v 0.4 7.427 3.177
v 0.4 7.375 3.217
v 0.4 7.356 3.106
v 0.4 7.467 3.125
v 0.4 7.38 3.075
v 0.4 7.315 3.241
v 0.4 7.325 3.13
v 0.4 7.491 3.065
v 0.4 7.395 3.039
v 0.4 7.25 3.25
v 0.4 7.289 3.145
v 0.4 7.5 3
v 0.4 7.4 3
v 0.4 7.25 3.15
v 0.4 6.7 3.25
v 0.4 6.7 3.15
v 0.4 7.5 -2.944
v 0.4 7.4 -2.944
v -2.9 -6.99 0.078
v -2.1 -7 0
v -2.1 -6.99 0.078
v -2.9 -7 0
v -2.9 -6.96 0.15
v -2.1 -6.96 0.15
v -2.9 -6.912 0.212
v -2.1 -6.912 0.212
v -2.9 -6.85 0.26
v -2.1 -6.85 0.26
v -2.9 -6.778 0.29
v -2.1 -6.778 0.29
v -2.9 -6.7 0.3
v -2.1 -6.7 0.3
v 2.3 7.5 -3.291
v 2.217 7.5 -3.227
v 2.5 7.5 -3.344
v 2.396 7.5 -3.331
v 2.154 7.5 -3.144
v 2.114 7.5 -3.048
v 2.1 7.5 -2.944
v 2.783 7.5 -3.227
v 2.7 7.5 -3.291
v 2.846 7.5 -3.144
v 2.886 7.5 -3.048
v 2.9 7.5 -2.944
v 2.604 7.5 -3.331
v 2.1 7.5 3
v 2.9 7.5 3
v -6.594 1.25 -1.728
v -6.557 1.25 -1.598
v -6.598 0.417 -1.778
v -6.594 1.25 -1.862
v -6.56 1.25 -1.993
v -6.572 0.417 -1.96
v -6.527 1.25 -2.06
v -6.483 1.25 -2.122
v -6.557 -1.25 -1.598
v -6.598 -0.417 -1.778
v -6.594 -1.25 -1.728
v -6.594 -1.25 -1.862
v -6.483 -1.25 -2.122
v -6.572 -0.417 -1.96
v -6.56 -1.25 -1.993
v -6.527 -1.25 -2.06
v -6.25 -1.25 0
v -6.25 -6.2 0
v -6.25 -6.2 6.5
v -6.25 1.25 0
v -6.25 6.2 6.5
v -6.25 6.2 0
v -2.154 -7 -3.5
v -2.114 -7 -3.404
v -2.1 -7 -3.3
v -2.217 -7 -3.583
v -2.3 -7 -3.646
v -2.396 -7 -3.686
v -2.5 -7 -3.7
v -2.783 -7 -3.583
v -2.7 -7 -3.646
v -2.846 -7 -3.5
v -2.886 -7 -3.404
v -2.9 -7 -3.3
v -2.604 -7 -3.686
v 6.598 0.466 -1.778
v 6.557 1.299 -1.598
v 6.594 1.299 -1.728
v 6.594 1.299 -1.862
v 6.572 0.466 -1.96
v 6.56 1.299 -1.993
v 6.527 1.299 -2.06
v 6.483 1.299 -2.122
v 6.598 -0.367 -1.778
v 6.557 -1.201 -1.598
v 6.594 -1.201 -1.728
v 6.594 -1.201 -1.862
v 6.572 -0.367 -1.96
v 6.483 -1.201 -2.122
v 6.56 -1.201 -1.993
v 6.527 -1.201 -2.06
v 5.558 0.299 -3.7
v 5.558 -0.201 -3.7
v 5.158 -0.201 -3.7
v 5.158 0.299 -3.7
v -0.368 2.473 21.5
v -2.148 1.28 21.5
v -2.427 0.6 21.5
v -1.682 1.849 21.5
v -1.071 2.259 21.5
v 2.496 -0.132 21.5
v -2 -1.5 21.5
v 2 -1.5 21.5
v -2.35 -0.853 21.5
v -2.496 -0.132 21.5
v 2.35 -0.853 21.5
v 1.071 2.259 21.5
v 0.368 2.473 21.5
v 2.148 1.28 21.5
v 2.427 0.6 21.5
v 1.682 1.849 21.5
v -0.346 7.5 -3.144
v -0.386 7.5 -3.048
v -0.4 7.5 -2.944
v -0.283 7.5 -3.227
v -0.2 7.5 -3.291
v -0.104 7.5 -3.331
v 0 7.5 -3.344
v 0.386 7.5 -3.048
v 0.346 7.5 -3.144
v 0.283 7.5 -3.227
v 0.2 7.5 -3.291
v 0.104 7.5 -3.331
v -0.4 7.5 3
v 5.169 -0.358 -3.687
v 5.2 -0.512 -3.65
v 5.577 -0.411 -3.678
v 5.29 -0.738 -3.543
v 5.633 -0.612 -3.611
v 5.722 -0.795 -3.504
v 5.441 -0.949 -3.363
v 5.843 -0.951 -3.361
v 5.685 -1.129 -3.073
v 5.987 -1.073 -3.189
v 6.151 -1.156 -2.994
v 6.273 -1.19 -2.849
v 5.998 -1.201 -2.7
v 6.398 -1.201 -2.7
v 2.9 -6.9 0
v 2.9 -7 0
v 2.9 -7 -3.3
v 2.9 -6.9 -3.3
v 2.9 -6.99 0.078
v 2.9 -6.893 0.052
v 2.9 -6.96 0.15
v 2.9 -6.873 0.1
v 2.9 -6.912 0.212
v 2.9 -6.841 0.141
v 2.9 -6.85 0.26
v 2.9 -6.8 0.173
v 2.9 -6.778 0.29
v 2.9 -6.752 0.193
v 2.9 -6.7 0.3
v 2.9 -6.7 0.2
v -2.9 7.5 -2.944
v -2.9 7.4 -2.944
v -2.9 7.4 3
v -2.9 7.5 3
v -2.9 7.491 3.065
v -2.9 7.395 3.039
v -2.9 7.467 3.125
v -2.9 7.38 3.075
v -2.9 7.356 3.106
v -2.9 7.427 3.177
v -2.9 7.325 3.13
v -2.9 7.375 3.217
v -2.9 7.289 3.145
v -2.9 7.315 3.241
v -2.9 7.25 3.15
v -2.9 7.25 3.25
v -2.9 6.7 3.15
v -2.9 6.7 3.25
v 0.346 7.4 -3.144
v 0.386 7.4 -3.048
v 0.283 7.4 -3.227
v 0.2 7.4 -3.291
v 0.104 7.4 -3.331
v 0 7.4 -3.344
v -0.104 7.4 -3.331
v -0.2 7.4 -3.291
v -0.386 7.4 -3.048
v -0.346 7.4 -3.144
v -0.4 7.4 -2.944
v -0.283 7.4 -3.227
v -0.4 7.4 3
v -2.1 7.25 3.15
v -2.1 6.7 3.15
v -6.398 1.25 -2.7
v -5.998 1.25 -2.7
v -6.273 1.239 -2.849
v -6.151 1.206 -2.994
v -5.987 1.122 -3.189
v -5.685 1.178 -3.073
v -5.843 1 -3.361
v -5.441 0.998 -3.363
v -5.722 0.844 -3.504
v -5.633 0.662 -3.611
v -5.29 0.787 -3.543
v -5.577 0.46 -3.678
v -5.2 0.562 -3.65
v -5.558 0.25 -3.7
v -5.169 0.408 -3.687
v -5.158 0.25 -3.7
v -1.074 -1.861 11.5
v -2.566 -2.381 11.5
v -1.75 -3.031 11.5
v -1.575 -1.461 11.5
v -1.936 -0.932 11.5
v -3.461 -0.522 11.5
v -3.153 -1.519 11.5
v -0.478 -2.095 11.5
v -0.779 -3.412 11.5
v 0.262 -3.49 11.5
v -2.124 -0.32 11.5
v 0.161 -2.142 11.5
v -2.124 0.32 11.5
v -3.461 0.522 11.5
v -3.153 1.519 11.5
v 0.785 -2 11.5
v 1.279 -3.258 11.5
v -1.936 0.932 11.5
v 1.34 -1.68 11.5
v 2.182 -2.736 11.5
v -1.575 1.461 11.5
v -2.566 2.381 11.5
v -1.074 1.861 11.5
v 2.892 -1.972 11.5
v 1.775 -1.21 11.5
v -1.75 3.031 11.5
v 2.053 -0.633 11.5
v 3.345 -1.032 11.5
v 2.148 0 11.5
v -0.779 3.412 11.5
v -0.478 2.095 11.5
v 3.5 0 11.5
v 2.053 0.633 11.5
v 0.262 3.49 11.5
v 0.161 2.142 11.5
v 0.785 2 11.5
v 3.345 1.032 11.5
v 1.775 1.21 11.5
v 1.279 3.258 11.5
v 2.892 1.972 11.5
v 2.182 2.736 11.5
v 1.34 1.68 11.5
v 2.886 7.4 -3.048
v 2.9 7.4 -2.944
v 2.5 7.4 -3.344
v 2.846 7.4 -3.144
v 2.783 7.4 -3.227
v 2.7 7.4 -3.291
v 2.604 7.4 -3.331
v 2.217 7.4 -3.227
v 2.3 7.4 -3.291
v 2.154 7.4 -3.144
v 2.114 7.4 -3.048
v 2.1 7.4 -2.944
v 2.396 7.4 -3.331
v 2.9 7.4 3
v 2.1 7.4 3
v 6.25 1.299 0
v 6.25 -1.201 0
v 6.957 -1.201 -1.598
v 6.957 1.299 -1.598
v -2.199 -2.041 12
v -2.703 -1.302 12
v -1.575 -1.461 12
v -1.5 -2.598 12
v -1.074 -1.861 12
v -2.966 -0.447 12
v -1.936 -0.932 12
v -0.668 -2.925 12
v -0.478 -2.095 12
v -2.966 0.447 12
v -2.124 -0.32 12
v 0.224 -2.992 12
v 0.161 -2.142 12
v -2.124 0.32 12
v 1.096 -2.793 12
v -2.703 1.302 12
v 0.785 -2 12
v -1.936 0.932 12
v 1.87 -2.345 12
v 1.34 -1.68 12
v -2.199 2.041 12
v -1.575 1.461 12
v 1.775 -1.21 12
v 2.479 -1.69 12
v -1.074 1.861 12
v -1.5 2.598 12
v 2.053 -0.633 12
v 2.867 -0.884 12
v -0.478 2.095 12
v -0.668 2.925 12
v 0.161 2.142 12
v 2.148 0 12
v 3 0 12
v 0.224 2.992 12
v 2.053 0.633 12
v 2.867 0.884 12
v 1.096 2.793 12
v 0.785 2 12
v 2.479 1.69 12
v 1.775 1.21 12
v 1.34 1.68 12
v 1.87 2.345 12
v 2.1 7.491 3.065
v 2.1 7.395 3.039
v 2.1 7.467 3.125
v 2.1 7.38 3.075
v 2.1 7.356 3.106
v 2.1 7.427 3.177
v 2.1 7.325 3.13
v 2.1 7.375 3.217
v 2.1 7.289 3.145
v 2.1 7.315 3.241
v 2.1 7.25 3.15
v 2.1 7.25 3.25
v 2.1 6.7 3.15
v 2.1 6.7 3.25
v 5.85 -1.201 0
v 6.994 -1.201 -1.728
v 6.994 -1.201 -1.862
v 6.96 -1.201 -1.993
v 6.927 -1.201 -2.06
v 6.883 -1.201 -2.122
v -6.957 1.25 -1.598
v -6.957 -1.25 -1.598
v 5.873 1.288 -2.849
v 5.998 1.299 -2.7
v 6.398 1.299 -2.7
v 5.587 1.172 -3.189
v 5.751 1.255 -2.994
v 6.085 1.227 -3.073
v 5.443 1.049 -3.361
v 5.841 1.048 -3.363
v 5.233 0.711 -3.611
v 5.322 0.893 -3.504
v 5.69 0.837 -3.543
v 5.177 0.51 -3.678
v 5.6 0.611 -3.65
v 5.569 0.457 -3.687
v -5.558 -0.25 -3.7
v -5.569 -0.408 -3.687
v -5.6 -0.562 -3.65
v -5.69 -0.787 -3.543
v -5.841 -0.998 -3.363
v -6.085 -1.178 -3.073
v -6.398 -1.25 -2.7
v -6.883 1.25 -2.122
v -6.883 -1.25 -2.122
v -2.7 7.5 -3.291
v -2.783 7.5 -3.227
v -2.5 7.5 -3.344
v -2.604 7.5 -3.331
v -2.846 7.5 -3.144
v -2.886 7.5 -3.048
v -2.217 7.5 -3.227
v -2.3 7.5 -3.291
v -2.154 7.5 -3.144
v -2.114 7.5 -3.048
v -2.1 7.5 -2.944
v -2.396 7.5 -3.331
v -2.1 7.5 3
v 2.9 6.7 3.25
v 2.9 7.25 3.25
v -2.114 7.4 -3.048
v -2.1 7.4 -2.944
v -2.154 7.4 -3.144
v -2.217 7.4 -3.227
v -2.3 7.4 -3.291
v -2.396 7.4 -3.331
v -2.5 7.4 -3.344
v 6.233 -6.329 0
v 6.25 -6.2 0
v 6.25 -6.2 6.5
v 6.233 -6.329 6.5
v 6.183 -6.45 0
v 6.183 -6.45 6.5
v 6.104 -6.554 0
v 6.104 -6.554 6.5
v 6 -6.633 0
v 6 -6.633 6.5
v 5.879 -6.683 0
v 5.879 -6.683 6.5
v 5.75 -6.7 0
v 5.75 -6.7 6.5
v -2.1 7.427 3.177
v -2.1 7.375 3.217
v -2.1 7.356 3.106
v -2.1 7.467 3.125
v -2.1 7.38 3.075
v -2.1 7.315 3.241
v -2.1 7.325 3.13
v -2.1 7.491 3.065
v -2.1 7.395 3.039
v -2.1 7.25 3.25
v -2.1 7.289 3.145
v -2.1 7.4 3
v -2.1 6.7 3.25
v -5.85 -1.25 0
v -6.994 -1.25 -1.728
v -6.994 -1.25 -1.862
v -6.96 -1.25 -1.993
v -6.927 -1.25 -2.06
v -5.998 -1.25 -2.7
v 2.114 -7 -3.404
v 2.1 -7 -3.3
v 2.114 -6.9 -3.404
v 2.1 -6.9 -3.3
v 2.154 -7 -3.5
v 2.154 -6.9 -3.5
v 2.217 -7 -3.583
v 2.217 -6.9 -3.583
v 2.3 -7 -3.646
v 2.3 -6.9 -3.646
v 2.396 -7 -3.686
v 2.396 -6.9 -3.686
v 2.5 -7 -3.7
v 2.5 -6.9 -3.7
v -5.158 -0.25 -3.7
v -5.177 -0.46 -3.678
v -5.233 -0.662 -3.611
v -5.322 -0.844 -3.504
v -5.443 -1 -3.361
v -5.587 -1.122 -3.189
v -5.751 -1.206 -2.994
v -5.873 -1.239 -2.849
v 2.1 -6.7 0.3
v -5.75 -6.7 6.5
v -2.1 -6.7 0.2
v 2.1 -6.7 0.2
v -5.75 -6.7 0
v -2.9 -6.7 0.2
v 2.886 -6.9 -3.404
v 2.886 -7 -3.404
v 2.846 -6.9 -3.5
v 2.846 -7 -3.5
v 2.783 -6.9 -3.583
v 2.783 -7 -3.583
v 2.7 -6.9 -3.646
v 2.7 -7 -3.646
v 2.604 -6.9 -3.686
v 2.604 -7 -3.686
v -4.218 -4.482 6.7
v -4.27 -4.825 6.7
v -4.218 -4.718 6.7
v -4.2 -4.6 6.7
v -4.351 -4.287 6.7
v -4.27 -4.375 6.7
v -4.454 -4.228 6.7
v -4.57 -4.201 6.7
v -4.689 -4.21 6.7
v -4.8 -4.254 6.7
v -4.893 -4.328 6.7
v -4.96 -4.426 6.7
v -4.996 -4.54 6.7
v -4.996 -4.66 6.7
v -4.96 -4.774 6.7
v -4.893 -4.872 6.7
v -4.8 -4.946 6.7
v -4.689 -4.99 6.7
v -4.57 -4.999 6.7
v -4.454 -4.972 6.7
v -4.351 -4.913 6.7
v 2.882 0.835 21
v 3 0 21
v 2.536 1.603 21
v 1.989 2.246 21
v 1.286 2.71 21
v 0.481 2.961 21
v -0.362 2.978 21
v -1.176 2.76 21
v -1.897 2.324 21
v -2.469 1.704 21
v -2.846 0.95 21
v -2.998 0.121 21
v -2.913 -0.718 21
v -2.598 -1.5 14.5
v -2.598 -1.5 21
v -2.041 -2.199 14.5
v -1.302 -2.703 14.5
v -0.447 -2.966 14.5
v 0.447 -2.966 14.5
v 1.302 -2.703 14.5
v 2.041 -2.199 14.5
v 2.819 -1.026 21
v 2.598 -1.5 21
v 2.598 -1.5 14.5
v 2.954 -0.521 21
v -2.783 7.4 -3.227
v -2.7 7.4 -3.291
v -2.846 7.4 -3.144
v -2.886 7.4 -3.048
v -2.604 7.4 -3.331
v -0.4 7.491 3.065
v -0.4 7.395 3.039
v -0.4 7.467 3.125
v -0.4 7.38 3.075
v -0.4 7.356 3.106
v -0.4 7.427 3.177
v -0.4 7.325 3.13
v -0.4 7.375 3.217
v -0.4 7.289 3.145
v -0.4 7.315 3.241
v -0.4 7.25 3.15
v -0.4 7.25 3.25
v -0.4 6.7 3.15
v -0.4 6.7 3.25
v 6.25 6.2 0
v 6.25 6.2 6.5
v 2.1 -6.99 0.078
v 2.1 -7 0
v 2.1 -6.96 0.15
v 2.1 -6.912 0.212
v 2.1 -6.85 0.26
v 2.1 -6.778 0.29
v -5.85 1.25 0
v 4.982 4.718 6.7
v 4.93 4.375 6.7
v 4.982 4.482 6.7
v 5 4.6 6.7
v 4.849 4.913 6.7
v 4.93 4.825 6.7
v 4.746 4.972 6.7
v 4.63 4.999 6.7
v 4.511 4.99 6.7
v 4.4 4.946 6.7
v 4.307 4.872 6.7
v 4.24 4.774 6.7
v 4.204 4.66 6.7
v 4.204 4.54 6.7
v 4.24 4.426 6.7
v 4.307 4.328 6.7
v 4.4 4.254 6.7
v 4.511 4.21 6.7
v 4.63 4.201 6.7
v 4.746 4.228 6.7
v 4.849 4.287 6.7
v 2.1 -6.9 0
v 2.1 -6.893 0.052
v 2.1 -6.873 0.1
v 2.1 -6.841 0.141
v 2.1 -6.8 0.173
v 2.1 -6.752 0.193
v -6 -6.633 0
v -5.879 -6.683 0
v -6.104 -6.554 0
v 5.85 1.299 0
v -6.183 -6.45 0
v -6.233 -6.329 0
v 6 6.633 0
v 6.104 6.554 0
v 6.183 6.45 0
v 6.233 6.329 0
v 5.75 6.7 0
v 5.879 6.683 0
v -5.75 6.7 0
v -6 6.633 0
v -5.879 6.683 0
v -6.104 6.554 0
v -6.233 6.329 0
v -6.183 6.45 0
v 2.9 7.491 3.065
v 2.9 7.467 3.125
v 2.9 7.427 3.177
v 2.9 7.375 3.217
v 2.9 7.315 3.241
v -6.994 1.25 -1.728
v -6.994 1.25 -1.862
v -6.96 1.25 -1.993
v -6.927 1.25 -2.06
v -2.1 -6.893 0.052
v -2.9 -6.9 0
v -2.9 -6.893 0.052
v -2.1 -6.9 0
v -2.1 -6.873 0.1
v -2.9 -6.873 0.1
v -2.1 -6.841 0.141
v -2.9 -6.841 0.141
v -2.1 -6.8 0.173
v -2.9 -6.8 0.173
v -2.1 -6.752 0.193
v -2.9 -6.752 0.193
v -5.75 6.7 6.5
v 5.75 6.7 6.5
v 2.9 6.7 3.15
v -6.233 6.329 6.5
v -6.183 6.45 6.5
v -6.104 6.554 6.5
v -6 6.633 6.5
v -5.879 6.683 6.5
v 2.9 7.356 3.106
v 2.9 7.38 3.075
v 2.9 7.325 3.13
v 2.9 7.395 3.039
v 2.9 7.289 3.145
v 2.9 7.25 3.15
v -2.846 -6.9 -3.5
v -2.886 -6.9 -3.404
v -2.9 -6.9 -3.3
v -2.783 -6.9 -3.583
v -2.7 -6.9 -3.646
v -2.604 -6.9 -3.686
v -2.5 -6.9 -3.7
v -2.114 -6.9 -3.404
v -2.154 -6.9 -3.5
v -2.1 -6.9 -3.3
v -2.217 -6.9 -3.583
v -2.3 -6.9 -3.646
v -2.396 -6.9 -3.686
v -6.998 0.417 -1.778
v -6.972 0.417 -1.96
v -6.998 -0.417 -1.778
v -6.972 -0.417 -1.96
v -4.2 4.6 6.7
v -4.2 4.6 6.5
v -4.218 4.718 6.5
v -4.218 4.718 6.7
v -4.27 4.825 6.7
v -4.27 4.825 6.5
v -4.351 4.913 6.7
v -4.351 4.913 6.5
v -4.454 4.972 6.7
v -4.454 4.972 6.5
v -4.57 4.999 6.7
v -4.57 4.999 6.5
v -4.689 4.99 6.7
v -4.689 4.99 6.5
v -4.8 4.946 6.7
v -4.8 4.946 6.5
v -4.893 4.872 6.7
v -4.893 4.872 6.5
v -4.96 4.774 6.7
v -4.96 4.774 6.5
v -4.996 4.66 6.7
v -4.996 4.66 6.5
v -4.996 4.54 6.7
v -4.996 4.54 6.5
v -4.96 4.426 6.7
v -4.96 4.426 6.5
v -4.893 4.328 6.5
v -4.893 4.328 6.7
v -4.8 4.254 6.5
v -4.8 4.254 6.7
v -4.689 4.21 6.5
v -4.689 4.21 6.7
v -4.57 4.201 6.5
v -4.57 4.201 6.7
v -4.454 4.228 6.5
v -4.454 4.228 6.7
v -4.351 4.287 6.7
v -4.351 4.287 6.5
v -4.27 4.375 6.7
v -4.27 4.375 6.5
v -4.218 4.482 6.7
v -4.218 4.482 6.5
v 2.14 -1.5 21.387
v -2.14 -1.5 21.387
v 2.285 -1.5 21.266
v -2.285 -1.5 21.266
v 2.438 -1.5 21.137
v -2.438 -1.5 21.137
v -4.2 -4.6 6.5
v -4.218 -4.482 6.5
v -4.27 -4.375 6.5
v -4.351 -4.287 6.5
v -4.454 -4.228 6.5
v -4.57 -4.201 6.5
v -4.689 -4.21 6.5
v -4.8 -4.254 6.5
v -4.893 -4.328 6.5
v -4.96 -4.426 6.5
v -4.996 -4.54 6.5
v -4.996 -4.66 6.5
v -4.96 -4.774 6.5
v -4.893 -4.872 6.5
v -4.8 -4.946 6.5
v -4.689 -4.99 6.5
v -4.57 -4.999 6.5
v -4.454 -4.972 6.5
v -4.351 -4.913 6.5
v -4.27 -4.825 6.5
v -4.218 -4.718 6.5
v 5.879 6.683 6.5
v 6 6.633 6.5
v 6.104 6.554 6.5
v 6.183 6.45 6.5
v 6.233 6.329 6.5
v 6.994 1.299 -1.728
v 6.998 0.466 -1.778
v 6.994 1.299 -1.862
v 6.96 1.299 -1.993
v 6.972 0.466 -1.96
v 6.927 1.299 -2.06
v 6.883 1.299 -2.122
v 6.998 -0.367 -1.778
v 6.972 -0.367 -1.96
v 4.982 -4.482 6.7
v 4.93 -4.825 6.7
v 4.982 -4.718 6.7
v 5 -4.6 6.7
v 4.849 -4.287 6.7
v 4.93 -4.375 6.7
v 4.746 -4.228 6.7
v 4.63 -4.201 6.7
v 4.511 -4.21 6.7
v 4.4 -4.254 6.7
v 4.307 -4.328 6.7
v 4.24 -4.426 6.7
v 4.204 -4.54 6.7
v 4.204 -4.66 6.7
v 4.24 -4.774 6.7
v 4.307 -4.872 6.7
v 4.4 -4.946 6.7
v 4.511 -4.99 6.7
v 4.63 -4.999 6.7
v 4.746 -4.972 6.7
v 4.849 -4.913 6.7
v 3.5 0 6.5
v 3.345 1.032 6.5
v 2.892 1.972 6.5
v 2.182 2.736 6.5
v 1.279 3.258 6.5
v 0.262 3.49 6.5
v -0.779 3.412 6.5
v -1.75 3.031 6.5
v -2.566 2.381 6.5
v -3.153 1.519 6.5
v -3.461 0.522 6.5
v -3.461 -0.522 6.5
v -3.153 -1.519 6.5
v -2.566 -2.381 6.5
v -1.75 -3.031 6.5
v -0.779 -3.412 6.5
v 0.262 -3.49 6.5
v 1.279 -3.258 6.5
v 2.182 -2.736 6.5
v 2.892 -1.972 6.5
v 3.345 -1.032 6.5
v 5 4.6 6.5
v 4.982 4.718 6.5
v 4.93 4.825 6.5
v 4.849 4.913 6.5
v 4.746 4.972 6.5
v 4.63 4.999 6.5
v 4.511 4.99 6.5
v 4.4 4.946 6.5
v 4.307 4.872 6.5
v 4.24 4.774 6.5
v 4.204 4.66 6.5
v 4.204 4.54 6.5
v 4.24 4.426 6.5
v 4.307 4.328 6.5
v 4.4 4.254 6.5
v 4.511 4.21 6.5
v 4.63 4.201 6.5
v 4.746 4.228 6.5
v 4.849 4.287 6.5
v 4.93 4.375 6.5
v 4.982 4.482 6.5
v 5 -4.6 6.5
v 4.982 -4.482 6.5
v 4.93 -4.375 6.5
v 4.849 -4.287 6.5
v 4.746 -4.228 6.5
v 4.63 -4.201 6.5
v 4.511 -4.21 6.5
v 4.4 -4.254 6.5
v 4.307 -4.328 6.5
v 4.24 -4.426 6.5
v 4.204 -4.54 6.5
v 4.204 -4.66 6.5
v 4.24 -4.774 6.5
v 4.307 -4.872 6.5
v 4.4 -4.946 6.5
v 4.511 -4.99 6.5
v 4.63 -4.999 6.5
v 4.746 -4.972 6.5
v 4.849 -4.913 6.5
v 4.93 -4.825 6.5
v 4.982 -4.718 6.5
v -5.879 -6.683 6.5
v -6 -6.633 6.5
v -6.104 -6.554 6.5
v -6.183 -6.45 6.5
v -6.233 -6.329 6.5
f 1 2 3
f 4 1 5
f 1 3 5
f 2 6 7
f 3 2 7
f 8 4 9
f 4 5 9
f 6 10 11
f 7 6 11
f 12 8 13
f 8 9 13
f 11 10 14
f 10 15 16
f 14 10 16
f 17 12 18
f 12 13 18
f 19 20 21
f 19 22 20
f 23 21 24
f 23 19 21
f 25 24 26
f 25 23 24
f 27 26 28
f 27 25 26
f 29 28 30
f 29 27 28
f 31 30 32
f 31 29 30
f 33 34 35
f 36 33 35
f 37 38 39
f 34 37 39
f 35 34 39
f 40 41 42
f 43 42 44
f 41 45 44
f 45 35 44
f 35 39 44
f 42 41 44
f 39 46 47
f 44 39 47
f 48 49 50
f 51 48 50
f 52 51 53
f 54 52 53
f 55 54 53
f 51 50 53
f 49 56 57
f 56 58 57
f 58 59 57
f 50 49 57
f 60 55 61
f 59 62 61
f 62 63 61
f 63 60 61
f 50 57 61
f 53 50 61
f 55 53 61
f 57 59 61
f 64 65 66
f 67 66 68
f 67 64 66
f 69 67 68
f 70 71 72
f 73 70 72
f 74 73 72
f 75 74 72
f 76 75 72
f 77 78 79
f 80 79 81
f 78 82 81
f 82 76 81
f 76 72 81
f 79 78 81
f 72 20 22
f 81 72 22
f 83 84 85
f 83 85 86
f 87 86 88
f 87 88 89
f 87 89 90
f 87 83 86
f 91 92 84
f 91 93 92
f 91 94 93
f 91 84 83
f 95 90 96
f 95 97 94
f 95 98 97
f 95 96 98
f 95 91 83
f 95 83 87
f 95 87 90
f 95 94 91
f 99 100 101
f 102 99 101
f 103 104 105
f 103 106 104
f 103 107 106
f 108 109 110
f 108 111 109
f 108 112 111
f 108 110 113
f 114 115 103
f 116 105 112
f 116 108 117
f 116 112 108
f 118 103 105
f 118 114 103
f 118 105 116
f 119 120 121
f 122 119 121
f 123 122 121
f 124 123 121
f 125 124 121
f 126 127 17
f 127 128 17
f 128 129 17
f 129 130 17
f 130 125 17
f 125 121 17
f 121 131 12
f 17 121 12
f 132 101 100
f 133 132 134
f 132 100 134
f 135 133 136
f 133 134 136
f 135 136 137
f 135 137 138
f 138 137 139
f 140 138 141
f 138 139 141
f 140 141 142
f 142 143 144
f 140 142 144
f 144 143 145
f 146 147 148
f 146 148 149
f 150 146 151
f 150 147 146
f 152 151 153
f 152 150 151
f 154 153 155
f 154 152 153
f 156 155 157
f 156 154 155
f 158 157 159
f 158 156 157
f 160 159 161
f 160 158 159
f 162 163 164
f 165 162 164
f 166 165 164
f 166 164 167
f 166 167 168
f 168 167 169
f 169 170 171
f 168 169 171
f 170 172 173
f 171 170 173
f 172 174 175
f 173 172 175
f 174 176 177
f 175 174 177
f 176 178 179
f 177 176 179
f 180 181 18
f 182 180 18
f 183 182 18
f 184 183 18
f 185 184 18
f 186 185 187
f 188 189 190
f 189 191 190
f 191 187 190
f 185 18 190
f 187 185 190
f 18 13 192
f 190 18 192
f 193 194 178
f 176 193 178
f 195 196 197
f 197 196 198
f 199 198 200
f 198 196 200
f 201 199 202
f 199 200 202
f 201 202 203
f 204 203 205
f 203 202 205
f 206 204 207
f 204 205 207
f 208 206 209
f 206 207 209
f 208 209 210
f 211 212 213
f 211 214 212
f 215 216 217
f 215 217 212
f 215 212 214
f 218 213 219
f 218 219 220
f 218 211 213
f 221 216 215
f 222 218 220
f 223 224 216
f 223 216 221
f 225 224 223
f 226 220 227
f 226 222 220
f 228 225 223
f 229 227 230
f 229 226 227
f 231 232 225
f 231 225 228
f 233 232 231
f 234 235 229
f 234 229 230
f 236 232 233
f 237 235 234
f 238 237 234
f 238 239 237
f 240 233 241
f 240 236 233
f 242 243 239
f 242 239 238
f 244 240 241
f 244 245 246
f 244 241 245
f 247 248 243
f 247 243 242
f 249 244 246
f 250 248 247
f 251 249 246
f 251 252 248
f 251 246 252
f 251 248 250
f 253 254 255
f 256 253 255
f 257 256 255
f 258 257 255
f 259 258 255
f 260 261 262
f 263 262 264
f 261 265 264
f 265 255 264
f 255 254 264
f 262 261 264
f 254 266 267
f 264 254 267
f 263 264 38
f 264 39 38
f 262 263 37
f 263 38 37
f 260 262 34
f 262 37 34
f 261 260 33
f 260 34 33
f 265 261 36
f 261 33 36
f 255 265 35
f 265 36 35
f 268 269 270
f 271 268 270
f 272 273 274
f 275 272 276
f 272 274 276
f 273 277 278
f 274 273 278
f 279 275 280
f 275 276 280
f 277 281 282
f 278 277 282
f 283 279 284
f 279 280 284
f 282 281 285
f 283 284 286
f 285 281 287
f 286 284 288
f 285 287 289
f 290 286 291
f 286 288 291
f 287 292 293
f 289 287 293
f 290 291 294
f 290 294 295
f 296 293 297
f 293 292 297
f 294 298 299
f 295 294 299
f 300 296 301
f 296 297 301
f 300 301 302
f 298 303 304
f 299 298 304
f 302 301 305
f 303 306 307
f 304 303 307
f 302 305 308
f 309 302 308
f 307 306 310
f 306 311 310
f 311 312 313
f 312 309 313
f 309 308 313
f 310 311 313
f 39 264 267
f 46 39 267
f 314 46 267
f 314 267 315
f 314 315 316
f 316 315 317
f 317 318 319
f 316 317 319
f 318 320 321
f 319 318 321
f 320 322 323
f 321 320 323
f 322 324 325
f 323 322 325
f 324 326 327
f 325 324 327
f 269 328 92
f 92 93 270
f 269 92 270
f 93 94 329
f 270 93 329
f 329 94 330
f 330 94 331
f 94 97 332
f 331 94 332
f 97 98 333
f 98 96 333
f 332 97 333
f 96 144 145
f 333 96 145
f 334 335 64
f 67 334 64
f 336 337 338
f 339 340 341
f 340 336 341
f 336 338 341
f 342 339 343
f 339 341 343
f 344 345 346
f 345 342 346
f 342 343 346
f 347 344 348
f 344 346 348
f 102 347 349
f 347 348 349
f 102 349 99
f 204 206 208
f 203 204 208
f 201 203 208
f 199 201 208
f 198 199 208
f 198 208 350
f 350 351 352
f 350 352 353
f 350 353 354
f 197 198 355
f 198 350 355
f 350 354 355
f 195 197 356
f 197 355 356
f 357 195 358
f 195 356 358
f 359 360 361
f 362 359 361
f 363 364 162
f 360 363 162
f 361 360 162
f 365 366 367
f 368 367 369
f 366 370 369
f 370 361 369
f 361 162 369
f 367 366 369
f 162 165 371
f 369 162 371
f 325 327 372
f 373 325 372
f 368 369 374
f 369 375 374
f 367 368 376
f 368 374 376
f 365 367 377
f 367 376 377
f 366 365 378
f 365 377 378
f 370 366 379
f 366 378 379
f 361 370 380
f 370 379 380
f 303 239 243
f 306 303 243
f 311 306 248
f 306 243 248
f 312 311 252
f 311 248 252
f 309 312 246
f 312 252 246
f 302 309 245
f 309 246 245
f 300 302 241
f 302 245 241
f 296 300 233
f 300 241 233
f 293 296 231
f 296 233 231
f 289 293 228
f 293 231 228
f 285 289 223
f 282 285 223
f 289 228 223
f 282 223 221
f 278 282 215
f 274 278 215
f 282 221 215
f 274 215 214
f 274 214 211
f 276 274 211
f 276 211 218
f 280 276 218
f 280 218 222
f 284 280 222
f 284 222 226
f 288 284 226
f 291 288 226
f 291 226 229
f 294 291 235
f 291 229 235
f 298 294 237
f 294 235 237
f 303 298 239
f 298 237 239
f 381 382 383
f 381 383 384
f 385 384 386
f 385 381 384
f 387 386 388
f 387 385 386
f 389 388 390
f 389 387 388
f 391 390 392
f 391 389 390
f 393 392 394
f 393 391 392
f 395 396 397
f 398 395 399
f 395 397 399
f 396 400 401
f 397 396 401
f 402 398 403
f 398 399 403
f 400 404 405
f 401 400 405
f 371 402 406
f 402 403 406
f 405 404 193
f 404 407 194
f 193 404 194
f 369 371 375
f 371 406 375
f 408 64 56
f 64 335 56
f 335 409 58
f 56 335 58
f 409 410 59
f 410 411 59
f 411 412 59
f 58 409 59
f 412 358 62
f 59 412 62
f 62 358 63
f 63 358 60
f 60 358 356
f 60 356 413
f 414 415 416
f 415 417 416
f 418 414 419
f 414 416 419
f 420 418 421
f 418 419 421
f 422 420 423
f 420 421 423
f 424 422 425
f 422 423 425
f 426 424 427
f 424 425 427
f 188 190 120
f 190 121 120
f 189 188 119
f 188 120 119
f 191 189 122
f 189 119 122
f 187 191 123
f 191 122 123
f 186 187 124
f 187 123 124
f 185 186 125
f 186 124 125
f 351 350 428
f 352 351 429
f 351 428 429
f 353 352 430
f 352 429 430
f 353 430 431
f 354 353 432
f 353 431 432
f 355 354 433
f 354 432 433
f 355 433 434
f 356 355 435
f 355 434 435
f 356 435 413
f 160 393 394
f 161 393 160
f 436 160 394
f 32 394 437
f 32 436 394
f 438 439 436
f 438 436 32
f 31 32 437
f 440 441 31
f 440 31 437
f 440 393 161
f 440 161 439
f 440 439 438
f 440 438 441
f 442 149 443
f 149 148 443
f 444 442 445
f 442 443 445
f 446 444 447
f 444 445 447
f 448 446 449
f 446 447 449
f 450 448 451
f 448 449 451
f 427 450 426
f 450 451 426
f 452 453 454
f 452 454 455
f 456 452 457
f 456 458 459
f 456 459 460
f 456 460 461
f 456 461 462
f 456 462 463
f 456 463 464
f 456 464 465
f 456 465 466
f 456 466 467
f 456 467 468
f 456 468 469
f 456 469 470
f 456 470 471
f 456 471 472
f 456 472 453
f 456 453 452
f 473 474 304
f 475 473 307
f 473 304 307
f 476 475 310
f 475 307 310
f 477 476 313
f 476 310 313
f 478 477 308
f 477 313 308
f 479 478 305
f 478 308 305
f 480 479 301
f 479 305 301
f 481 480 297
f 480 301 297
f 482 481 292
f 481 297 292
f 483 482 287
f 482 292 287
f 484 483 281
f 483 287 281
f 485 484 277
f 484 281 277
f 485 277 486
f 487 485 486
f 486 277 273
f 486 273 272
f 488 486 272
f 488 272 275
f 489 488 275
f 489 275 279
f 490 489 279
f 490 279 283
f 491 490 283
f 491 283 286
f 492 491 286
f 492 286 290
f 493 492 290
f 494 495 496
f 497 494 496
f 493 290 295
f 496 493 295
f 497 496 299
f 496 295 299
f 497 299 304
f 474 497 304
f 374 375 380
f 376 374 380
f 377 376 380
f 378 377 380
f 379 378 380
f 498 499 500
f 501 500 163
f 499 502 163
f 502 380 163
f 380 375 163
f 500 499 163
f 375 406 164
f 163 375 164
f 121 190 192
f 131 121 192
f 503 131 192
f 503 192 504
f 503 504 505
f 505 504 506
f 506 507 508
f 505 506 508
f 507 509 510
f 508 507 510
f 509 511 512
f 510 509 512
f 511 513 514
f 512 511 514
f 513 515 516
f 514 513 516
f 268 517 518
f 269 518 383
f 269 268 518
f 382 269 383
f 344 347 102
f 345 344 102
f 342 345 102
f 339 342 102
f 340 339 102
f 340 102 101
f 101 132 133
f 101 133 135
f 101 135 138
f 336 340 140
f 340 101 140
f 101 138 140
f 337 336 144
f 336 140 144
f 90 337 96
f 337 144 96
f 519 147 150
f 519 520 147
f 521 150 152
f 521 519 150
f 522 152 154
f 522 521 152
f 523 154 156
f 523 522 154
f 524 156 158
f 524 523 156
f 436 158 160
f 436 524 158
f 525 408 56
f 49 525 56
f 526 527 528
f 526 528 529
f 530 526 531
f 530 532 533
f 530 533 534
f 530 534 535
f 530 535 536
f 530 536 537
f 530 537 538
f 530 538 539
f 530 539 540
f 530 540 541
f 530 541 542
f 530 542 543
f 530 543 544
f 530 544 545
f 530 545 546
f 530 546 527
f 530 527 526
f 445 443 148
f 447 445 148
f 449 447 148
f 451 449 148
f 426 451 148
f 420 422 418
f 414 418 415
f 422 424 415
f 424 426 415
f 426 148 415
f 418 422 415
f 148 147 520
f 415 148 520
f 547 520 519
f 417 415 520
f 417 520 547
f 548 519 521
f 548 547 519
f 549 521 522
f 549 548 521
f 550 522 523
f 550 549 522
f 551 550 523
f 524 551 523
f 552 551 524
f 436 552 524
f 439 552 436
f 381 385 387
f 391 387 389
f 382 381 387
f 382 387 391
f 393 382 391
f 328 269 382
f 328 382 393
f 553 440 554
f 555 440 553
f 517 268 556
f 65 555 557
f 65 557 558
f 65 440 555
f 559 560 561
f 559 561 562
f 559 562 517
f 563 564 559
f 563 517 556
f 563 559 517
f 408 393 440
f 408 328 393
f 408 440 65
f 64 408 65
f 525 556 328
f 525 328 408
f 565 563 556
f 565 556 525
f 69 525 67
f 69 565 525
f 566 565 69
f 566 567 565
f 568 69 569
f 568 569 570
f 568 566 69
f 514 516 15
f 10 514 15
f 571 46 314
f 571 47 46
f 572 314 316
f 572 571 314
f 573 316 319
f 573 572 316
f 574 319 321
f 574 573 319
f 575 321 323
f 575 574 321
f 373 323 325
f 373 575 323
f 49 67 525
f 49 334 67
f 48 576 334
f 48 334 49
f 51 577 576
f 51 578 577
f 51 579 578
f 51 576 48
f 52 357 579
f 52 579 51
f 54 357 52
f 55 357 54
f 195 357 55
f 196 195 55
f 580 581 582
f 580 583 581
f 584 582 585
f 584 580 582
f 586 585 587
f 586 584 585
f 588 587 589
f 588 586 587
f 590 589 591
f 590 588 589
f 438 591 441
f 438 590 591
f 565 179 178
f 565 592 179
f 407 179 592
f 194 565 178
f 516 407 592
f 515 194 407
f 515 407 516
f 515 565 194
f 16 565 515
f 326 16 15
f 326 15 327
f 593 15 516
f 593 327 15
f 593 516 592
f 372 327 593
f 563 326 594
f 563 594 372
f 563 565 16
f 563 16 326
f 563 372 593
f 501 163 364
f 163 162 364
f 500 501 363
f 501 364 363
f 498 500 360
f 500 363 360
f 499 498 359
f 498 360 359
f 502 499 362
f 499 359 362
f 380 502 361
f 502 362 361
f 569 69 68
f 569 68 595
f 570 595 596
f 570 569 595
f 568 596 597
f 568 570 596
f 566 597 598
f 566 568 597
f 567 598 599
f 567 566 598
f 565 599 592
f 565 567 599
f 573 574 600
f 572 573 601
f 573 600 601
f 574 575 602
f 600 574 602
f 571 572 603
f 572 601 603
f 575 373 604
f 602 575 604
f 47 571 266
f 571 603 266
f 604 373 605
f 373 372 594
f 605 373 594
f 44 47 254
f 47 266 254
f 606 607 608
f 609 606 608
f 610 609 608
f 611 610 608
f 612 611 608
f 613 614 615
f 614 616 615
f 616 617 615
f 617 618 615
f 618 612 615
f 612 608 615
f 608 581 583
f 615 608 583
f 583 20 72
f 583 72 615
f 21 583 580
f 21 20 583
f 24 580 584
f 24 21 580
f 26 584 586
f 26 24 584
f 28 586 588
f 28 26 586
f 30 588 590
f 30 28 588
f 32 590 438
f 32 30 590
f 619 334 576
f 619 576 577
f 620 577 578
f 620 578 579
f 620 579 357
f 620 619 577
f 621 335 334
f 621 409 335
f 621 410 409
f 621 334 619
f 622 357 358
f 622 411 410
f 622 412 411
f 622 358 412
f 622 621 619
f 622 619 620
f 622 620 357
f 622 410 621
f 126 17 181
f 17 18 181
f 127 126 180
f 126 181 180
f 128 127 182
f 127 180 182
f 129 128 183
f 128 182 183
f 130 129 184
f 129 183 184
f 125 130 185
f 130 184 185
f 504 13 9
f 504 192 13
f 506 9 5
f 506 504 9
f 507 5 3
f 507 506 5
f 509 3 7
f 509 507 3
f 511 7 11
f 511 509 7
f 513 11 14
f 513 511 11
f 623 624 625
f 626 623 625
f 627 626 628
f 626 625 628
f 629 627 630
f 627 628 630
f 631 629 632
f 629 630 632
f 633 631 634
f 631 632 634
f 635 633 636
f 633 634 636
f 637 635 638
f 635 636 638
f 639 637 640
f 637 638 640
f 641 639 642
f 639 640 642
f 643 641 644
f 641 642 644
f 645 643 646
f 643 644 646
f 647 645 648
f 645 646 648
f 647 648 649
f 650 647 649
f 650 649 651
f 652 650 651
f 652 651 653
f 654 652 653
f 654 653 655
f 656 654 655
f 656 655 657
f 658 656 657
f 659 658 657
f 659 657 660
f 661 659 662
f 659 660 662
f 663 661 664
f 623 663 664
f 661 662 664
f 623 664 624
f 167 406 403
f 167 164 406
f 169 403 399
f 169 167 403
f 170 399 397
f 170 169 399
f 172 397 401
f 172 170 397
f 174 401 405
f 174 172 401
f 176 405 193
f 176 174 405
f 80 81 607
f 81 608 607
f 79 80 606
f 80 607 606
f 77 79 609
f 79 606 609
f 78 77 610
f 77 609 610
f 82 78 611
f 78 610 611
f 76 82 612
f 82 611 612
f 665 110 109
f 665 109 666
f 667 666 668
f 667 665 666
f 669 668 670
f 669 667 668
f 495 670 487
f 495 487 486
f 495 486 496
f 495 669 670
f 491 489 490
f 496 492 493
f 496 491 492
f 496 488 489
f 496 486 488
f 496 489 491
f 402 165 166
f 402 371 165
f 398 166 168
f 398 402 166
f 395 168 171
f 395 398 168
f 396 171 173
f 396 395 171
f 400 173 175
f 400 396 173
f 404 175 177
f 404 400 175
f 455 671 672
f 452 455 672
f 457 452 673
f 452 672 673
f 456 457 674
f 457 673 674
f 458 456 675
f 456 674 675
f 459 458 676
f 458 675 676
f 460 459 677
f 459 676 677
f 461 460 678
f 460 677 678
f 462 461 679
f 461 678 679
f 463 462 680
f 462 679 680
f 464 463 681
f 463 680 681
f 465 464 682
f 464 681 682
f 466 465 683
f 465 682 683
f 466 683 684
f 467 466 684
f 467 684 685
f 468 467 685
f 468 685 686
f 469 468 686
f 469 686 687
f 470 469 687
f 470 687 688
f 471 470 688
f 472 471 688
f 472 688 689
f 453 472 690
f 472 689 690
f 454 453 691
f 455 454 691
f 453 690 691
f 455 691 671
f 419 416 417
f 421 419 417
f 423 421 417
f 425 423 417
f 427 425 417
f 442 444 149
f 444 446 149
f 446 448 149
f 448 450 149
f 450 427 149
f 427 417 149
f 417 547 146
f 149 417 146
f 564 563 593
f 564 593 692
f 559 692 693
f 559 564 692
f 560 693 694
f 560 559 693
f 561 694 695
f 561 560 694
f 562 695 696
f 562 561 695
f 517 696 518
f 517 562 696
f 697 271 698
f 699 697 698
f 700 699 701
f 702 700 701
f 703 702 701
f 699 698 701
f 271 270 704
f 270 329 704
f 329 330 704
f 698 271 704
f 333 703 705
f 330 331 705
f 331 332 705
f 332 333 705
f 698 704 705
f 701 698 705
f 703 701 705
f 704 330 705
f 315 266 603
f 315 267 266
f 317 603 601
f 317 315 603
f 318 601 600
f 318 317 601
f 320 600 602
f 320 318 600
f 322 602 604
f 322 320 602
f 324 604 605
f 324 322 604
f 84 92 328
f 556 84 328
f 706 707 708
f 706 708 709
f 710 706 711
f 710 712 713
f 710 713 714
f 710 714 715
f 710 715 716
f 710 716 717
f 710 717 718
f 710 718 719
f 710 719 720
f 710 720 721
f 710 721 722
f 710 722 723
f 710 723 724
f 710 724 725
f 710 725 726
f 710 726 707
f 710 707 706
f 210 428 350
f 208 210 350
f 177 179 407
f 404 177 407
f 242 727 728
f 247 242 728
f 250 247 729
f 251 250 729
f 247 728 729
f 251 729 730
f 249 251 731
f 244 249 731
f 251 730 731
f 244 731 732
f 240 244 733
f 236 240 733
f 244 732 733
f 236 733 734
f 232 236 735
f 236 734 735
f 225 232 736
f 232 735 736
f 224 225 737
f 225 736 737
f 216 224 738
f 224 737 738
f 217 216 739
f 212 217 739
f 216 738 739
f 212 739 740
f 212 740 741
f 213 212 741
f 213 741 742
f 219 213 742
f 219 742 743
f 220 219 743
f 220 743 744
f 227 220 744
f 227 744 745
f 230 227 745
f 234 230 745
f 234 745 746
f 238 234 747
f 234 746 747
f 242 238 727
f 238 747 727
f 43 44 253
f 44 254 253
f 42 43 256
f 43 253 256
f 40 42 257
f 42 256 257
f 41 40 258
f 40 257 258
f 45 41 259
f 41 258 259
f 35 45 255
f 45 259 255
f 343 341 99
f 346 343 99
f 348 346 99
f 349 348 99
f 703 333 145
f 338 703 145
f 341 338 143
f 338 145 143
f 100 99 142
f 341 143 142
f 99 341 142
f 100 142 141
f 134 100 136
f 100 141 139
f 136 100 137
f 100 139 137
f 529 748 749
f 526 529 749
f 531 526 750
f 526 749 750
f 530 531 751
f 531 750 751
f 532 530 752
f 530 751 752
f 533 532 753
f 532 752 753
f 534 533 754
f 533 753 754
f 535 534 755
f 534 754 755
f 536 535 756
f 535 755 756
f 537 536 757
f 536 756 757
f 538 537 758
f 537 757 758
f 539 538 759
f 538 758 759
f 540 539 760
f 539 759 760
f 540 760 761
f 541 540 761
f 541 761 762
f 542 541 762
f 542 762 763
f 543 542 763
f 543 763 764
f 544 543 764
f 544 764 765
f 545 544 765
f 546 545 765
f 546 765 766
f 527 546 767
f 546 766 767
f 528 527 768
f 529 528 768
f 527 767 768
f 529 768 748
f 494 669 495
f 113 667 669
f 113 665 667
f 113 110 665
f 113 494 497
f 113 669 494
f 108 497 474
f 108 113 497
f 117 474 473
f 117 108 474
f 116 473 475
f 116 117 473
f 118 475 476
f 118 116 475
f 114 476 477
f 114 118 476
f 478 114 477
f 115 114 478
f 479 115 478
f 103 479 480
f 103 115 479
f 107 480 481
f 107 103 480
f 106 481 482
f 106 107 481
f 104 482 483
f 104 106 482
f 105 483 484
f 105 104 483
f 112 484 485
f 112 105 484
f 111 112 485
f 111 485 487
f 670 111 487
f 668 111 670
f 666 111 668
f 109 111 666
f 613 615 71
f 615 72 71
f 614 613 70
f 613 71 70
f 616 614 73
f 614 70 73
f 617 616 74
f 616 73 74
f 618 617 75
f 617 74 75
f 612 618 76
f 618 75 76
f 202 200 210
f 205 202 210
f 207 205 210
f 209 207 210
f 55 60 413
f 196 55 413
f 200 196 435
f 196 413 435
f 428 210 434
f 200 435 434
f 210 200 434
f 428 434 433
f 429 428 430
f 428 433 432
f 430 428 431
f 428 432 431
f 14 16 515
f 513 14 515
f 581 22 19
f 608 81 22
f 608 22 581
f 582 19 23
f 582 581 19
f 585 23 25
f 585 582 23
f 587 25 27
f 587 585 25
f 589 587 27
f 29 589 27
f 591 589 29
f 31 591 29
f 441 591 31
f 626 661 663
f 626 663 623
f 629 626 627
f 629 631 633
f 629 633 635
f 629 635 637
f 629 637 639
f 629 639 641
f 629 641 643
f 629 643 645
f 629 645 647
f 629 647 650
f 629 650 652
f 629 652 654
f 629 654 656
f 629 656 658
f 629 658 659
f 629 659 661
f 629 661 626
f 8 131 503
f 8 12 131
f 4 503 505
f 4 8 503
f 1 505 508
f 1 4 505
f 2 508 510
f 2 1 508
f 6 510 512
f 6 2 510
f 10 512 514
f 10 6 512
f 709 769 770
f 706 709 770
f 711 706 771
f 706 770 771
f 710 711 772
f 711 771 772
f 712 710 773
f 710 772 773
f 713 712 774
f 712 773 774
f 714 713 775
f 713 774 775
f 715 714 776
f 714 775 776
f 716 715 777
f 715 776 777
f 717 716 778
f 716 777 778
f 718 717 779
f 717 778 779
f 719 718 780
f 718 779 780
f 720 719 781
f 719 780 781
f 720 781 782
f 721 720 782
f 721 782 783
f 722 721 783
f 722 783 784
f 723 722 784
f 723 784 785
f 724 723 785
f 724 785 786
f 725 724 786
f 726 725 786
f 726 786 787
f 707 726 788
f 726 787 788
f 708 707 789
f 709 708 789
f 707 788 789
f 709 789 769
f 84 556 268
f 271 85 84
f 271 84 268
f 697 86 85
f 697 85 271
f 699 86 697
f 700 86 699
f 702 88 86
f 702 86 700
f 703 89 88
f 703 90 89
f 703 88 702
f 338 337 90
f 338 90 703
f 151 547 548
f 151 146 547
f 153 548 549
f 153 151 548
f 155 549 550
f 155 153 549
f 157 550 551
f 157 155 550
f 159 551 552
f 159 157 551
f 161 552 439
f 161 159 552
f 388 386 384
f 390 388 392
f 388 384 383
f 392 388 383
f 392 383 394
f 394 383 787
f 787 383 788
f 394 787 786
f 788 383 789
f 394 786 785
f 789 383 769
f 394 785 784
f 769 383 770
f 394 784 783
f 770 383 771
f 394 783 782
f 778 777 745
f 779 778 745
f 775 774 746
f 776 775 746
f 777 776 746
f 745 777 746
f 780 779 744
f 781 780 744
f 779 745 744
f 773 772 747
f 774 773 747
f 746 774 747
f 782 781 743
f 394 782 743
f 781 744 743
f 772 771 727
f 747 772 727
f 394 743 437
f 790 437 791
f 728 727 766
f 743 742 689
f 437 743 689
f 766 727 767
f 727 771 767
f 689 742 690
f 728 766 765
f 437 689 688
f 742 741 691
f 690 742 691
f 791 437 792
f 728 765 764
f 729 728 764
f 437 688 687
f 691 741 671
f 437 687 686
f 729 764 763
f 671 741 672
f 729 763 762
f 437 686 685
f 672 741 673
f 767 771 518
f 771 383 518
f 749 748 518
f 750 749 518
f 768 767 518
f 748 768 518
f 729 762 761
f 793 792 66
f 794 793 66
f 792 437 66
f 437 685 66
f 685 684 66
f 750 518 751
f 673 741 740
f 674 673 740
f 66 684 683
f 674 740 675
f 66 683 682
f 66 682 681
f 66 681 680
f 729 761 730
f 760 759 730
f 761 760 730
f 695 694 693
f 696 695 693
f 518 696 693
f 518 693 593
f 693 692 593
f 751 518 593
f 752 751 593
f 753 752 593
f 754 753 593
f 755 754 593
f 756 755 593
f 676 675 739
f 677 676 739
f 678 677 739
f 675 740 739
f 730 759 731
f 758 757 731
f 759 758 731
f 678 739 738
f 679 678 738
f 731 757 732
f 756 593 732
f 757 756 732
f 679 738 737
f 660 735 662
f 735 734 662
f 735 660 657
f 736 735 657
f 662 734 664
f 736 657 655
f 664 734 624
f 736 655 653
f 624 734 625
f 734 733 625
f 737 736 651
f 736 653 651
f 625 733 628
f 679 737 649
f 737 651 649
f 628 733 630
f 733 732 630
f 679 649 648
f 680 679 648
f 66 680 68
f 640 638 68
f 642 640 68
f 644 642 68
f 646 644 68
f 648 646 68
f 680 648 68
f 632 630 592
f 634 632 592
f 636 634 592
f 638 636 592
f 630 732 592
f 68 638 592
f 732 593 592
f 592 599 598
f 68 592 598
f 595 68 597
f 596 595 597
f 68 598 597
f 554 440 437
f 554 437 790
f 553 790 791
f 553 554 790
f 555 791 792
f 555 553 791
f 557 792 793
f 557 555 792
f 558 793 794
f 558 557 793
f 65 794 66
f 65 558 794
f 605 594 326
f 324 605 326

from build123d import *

# Parameters (mm, degrees)
EXTRUDE_1_DEPTH     = 6.5
SKETCH_2_R          = 0.4
EXTRUDE_2_DEPTH     = 0.2
SKETCH_3_R          = 3.5
EXTRUDE_3_DEPTH     = 5
SKETCH_4_R          = 3
EXTRUDE_5_DEPTH     = 10
SKETCH_5_W          = 6.52724622
SKETCH_5_H          = 2.89226862
CUT_EXTRUDE_1_DEPTH = 7
CHAMFER_1_SIZE      = 0.5
SKETCH_6_R          = 3.145240335
SKETCH_6_R_2        = 2.148425486
CUT_EXTRUDE_2_DEPTH = 0.5
SWEEP_START         = -1.25
SWEEP_12_DEPTH      = 2.5
SWEEP_START_2       = -1.200661392
SWEEP_13_DEPTH      = 2.5
SKETCH_13_W         = 0.8
SKETCH_13_H         = 0.1
SKETCH_14_W         = 0.8
SKETCH_14_H         = 0.1
FILLET_1_R          = 0.4
FILLET_2_R          = 1


# Read off the part's stored shape, not the designer's step: По траектории12, По траектории13
# Some blends are built 0.0001 mm under size
with BuildPart() as part:
    # Эскиз1 → Бобышка-Вытянуть1 (new body)
    with BuildSketch(Plane.XY):
        with BuildLine():
            Line((-5.75, 6.7), (5.75, 6.7))
            ThreePointArc((5.75, 6.7), (6.103553391, 6.553553391), (6.25, 6.2))
            Line((6.25, 6.2), (6.25, -6.2))
            ThreePointArc((6.25, -6.2), (6.103553391, -6.553553391), (5.75, -6.7))
            Line((5.75, -6.7), (-5.75, -6.7))
            ThreePointArc((-5.75, -6.7), (-6.103553391, -6.553553391), (-6.25, -6.2))
            Line((-6.25, -6.2), (-6.25, 6.2))
            ThreePointArc((-6.25, 6.2), (-6.103553391, 6.553553391), (-5.75, 6.7))
        make_face()
    extrude(amount=EXTRUDE_1_DEPTH)

    # Эскиз2 → Бобышка-Вытянуть2 (add)
    with BuildSketch(Plane.XY.offset(6.5)):
        with Locations((-4.6, 4.6)):
            Circle(SKETCH_2_R)
        with Locations((4.6, 4.6)):
            Circle(SKETCH_2_R)
        with Locations((4.6, -4.6)):
            Circle(SKETCH_2_R)
        with Locations((-4.6, -4.6)):
            Circle(SKETCH_2_R)
    extrude(amount=EXTRUDE_2_DEPTH)

    # Эскиз3 → Бобышка-Вытянуть3 (add)
    with BuildSketch(Plane.XY.offset(6.5)):
        Circle(SKETCH_3_R)
    extrude(amount=EXTRUDE_3_DEPTH)

    # Эскиз4 → Бобышка-Вытянуть5 (add)
    with BuildSketch(Plane.XY.offset(11.5)):
        Circle(SKETCH_4_R)
    extrude(amount=EXTRUDE_5_DEPTH)

    # Эскиз5 → Вырез-Вытянуть1 (cut)
    with BuildSketch(Plane.XY.offset(21.5)):
        with Locations((0, -2.94613431)):
            Rectangle(SKETCH_5_W, SKETCH_5_H)
    extrude(amount=-CUT_EXTRUDE_1_DEPTH, mode=Mode.SUBTRACT)

    # Фаска1
    chamfer_1_edges = [part.edges().sort_by_distance(p)[0] for p in [
        (-0.776457135, 2.897777479, 21.5),
    ]]
    chamfer(chamfer_1_edges, length=CHAMFER_1_SIZE)

    # Эскиз6 → Вырез-Вытянуть2 (cut)
    with BuildSketch(Plane.XY.offset(11.5)):
        Circle(SKETCH_6_R)
        Circle(SKETCH_6_R_2, mode=Mode.SUBTRACT)
    extrude(amount=CUT_EXTRUDE_2_DEPTH, mode=Mode.SUBTRACT)

    # По траектории12 outline → По траектории12 (add)
    with BuildSketch(Plane(origin=(0, 0, 0), x_dir=(1, 0, 0), z_dir=(0, 1, 0)).offset(SWEEP_START)):
        with BuildLine():
            Line((-5.85, 0), (-6.557222106, 1.597963985))
            add(Edge.make_bspline(
                [(-6.557222106, 1.597963985), (-6.632428218, 1.767891731), (-6.602440024, 1.979444008), (-6.482970147, 2.121775827)],
                knots=[0.400295136, 0.400295136, 0.400295136, 0.400295136, 0.527997483, 0.527997483, 0.527997483, 0.527997483], degree=3))
            Line((-6.482970147, 2.121775827), (-5.158247051, 3.7))
            Line((-5.158247051, 3.7), (-5.558247051, 3.7))
            Line((-5.558247051, 3.7), (-6.882970147, 2.121775827))
            add(Edge.make_bspline(
                [(-6.957222106, 1.597963985), (-7.032428218, 1.767891731), (-7.002440024, 1.979444008), (-6.882970147, 2.121775827)],
                knots=[0.400295136, 0.400295136, 0.400295136, 0.400295136, 0.527997483, 0.527997483, 0.527997483, 0.527997483], degree=3))
            Line((-6.957222106, 1.597963985), (-6.25, 0))
            Line((-6.25, 0), (-5.85, 0))
        make_face()
    extrude(amount=SWEEP_12_DEPTH)

    # По траектории13 outline → По траектории13 (add)
    with BuildSketch(Plane(origin=(0, 0, 0), x_dir=(1, 0, 0), z_dir=(0, 1, 0)).offset(SWEEP_START_2)):
        with BuildLine():
            Line((6.25, 0), (6.957222106, 1.597963985))
            add(Edge.make_bspline(
                [(6.957222106, 1.597963985), (7.032428218, 1.767891731), (7.002440024, 1.979444008), (6.882970147, 2.121775827)],
                knots=[0.400295136, 0.400295136, 0.400295136, 0.400295136, 0.527997483, 0.527997483, 0.527997483, 0.527997483], degree=3))
            Line((6.882970147, 2.121775827), (5.558247051, 3.7))
            Line((5.558247051, 3.7), (5.158247051, 3.7))
            Line((5.158247051, 3.7), (6.482970147, 2.121775827))
            add(Edge.make_bspline(
                [(6.557222106, 1.597963985), (6.632428218, 1.767891731), (6.602440024, 1.979444008), (6.482970147, 2.121775827)],
                knots=[0.400295136, 0.400295136, 0.400295136, 0.400295136, 0.527997483, 0.527997483, 0.527997483, 0.527997483], degree=3))
            Line((6.557222106, 1.597963985), (5.85, 0))
            Line((5.85, 0), (6.25, 0))
        make_face()
    extrude(amount=SWEEP_13_DEPTH)

    # По траектории14: sweep along a path in Эскиз15
    with BuildLine(Plane(origin=(0, 0, 0), x_dir=(0, 0, -1), z_dir=(1, 0, 0))) as sweep_14_path:
        Line((3.7, -7), (0, -7))
        ThreePointArc((0, -7), (-0.212132034, -6.912132034), (-0.3, -6.7))
    # Эскиз13 → По траектории14 (sweep)
    with BuildSketch(Plane(origin=(0, 0, 0), x_dir=(-1, 0, 0), z_dir=(0, 0, -1))):
        with Locations((2.5, -6.95)):
            Rectangle(SKETCH_13_W, SKETCH_13_H)
        with Locations((-2.5, -6.95)):
            Rectangle(SKETCH_13_W, SKETCH_13_H)
    sweep(path=sweep_14_path.line)

    # По траектории15: sweep along a path in Эскиз16
    with BuildLine(Plane(origin=(0, 0, 0), x_dir=(0, 0, -1), z_dir=(1, 0, 0))) as sweep_15_path:
        Line((3.344273236, 7.5), (0, 7.5))
        Line((0, 7.5), (-3, 7.5))
        ThreePointArc((-3, 7.5), (-3.176776695, 7.426776695), (-3.25, 7.25))
        Line((-3.25, 7.25), (-3.25, 6.7))
    # Эскиз14 → По траектории15 (sweep)
    with BuildSketch(Plane(origin=(0, 0, 0), x_dir=(-1, 0, 0), z_dir=(0, 0, -1))):
        with Locations((2.5, 7.45)):
            Rectangle(SKETCH_14_W, SKETCH_14_H)
        with Locations((0, 7.45)):
            Rectangle(SKETCH_14_W, SKETCH_14_H)
        with Locations((-2.5, 7.45)):
            Rectangle(SKETCH_14_W, SKETCH_14_H)
    sweep(path=sweep_15_path.line)

    # Скругление1
    fillet_1_edges = [part.edges().sort_by_distance(p)[0] for p in [
        (-2.9, -6.95, -3.7),
        (-2.1, -6.95, -3.7),
        (2.1, -6.95, -3.7),
        (2.9, -6.95, -3.7),
        (-2.9, 7.45, -3.344273236),
        (-2.1, 7.45, -3.344273236),
        (0.4, 7.45, -3.344273236),
        (-0.4, 7.45, -3.344273236),
        (2.1, 7.45, -3.344273236),
        (2.9, 7.45, -3.344273236),
    ]]
    fillet(fillet_1_edges, radius=FILLET_1_R - 0.0001)  # a hair under: the kernel refuses the full size

    # Скругление2
    # the kernel refuses this fillet: 1 mm, written as the material it takes off along each edge
    with BuildSketch(Plane(origin=(8.058247051, -1.200661392, -3.7), x_dir=(0, 0, 1), z_dir=(-1, 0, 0)), Plane(origin=(-2.658247051, -1.25, -3.7), x_dir=(0, 0, 1), z_dir=(-1, 0, 0))) as fillet_2_piece_1:
        with BuildLine():
            CenterArc((FILLET_2_R, FILLET_2_R), FILLET_2_R, 180, 90)
            Line((0, FILLET_2_R), (0, 0))
            Line((0, 0), (FILLET_2_R, 0))
        make_face()
    extrude(amount=5.4, mode=Mode.SUBTRACT)
    with BuildSketch(Plane(origin=(8.058247051, 1.299338608, -3.7), x_dir=(0, 0, 1), z_dir=(-1, 0, 0)), Plane(origin=(-2.658247051, 1.25, -3.7), x_dir=(0, 0, 1), z_dir=(-1, 0, 0))) as fillet_2_piece_2:
        with BuildLine():
            CenterArc((FILLET_2_R, -FILLET_2_R), FILLET_2_R, 90, 90)
            Line((0, -FILLET_2_R), (0, 0))
            Line((0, 0), (FILLET_2_R, 0))
        make_face()
    extrude(amount=5.4, mode=Mode.SUBTRACT)


solid = part.part
